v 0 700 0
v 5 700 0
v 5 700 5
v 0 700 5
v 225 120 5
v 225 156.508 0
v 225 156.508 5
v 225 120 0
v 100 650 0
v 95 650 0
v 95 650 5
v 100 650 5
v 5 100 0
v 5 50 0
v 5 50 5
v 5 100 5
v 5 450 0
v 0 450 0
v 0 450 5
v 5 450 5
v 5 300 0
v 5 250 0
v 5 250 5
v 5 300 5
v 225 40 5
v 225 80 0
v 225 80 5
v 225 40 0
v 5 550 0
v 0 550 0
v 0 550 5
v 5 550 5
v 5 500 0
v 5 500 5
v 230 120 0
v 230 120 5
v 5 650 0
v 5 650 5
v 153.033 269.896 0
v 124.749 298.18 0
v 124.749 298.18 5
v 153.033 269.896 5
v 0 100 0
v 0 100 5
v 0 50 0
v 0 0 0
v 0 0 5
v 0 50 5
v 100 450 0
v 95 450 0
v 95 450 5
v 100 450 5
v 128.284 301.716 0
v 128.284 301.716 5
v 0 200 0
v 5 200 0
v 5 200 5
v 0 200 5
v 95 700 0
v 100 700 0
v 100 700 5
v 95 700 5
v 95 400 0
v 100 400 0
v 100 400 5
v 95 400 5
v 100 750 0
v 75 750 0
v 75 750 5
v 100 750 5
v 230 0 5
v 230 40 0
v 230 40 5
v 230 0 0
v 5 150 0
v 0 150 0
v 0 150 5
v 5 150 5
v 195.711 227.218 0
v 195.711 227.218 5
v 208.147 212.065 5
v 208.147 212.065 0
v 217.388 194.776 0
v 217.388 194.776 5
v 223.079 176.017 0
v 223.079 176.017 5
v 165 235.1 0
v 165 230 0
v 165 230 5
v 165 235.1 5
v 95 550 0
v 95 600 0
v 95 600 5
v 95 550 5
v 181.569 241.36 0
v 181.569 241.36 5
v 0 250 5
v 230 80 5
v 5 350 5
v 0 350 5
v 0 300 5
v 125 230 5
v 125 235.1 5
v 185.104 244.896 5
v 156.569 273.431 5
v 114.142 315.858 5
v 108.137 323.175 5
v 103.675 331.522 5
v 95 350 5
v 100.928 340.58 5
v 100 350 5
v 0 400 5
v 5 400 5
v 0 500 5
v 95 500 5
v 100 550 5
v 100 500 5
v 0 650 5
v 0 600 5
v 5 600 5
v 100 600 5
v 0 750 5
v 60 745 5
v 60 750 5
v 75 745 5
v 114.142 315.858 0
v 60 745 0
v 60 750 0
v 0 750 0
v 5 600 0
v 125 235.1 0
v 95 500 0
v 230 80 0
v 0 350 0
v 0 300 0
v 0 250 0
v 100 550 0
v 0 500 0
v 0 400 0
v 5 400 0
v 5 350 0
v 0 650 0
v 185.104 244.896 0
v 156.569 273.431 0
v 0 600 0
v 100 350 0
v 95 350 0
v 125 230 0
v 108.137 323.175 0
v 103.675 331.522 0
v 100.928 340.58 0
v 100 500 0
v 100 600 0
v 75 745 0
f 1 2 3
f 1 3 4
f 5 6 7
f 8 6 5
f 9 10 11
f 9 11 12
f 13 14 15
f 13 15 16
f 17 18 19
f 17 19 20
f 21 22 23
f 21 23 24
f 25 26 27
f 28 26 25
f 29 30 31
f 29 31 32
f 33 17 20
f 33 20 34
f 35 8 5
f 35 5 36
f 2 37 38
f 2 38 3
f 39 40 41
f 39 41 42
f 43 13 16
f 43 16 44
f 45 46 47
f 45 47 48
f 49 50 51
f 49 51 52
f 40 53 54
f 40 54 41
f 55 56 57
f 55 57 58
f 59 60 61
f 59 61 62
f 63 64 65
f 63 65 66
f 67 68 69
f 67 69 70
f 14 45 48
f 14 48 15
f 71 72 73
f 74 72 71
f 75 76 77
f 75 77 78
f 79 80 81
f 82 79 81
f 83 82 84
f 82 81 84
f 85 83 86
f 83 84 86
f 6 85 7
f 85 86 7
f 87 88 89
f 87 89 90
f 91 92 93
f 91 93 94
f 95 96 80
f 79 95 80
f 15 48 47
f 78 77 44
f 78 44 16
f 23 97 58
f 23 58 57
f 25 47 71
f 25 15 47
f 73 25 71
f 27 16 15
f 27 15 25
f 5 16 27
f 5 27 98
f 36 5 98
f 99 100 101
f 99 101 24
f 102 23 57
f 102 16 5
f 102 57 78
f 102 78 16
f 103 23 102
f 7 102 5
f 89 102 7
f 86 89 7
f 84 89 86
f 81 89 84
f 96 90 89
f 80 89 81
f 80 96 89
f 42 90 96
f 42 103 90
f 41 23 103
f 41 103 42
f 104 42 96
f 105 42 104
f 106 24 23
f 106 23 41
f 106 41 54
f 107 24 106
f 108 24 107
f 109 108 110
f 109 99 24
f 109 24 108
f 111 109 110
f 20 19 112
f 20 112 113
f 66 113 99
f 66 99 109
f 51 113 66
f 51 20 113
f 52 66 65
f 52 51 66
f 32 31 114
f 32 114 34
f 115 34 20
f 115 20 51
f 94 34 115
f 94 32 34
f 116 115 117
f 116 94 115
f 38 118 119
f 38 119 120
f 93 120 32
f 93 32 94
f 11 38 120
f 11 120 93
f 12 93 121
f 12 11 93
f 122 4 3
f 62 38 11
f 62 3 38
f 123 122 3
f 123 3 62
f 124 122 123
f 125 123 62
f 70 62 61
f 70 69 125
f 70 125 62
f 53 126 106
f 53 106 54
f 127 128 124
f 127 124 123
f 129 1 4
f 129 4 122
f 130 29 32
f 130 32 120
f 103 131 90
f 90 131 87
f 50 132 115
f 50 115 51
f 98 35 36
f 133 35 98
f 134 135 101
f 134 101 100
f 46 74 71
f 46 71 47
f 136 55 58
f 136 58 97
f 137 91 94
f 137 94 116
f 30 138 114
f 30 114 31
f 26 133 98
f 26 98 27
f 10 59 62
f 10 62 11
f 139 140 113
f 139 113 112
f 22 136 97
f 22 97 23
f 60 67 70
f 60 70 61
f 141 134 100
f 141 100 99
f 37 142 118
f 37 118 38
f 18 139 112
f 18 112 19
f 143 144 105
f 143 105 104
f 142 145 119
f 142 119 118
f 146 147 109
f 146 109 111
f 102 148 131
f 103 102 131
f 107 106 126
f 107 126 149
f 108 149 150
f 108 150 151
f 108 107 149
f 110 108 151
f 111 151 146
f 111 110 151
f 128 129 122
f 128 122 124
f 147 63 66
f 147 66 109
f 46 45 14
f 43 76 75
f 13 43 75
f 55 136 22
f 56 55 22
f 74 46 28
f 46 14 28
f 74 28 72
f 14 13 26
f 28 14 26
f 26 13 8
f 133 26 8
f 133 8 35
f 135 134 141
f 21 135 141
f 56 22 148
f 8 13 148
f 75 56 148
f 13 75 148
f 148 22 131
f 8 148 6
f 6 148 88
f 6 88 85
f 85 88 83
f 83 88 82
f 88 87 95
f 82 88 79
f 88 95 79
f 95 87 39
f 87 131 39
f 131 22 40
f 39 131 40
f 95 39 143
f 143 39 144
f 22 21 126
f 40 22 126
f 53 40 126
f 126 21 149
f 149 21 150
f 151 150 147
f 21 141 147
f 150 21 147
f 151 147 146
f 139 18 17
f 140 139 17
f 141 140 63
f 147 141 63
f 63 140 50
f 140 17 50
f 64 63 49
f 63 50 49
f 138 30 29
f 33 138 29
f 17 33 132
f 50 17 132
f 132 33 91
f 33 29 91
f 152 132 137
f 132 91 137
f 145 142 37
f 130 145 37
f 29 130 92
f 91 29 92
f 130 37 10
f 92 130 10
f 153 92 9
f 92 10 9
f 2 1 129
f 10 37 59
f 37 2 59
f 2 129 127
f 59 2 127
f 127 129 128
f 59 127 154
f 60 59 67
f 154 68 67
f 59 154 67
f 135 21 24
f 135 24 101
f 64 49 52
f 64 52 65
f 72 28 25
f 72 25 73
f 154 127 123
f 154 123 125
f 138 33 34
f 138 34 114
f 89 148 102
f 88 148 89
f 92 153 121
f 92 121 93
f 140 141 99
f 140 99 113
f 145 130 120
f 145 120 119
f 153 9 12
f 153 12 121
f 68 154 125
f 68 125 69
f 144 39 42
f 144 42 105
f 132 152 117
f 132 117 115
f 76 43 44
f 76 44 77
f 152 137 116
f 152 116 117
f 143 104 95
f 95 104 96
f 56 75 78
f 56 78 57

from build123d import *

# Parameters (mm, degrees)
ESQUISSE1_W             = 40
ESQUISSE1_H             = 5.1
BOSS_EXTRU_1_DEPTH      = 5
ENL_V_MAT_EXTRU_1_REACH = 7
BOSS_EXTRU_2_DEPTH      = 5


with BuildPart() as part:
    # Esquisse1 → Boss.-Extru.1 (new body)
    with BuildSketch(Plane.XY):
        Polygon((100, 330), (128.284271247, 301.715728753), (124.748737342, 298.180194847), (153.033008589, 269.895923599), (156.568542495, 273.431457505), (199.901875828, 230.098124172), (196.366341922, 226.562590266), (211.415404008, 211.51352818), (214.950937914, 215.049062086), (230, 200), (230, 160), (225, 160), (225, 120), (230, 120), (230, 80), (225, 80), (225, 40), (230, 40), (230, 0), (0, 0), (0, 50), (5, 50), (5, 100), (0, 100), (0, 150), (5, 150), (5, 200), (0, 200), (0, 250), (5, 250), (5, 300), (0, 300), (0, 350), (5, 350), (5, 400), (0, 400), (0, 450), (5, 450), (5, 500), (0, 500), (0, 550), (5, 550), (5, 600), (0, 600), (0, 650), (5, 650), (5, 700), (0, 700), (0, 750), (60, 750), (60, 745), (75, 745), (75, 750), (100, 750), (100, 700), (95, 700), (95, 650), (100, 650), (100, 600), (95, 600), (95, 550), (100, 550), (100, 500), (95, 500), (95, 450), (100, 450), (100, 400), (95, 400), (95, 350), (100, 350), align=None)
        with Locations((145, 232.55)):
            Rectangle(ESQUISSE1_W, ESQUISSE1_H, mode=Mode.SUBTRACT)
    extrude(amount=BOSS_EXTRU_1_DEPTH)

    # Esquisse3 → Enlèv. mat.-Extru.1 (cut, up to next)
    with BuildSketch(Plane.XY.offset(5), mode=Mode.PRIVATE) as enl_v_mat_extru_1_sk1:
        with BuildLine():
            Line((225, 156.507575951), (230, 156.507575951))
            Line((230, 156.507575951), (230, 200))
            Line((230, 200), (185.104076401, 244.895923599))
            Line((185.104076401, 244.895923599), (181.568542495, 241.360389693))
            Line((181.568542495, 241.360389693), (195.710678119, 227.218254069))
            ThreePointArc((195.710678119, 227.218254069), (217.387953251, 194.775919187), (225, 156.507575951))
        make_face()
    enl_v_mat_extru_1_tool1 = extrude(enl_v_mat_extru_1_sk1.sketch, amount=-ENL_V_MAT_EXTRU_1_REACH, mode=Mode.PRIVATE) & part.part
    add(enl_v_mat_extru_1_tool1.solids().sort_by_distance((215.711514, 201.173028, 5))[0], mode=Mode.SUBTRACT)

    # Esquisse4 → Boss.-Extru.2 (add)
    with BuildSketch(Plane.XY.offset(5)):
        with BuildLine():
            Line((100, 350), (100, 330))
            Line((100, 330), (114.142135624, 315.857864376))
            ThreePointArc((114.142135624, 315.857864376), (103.6754213, 331.52240935), (100, 350))
        make_face()
    extrude(amount=-BOSS_EXTRU_2_DEPTH)


solid = part.part
